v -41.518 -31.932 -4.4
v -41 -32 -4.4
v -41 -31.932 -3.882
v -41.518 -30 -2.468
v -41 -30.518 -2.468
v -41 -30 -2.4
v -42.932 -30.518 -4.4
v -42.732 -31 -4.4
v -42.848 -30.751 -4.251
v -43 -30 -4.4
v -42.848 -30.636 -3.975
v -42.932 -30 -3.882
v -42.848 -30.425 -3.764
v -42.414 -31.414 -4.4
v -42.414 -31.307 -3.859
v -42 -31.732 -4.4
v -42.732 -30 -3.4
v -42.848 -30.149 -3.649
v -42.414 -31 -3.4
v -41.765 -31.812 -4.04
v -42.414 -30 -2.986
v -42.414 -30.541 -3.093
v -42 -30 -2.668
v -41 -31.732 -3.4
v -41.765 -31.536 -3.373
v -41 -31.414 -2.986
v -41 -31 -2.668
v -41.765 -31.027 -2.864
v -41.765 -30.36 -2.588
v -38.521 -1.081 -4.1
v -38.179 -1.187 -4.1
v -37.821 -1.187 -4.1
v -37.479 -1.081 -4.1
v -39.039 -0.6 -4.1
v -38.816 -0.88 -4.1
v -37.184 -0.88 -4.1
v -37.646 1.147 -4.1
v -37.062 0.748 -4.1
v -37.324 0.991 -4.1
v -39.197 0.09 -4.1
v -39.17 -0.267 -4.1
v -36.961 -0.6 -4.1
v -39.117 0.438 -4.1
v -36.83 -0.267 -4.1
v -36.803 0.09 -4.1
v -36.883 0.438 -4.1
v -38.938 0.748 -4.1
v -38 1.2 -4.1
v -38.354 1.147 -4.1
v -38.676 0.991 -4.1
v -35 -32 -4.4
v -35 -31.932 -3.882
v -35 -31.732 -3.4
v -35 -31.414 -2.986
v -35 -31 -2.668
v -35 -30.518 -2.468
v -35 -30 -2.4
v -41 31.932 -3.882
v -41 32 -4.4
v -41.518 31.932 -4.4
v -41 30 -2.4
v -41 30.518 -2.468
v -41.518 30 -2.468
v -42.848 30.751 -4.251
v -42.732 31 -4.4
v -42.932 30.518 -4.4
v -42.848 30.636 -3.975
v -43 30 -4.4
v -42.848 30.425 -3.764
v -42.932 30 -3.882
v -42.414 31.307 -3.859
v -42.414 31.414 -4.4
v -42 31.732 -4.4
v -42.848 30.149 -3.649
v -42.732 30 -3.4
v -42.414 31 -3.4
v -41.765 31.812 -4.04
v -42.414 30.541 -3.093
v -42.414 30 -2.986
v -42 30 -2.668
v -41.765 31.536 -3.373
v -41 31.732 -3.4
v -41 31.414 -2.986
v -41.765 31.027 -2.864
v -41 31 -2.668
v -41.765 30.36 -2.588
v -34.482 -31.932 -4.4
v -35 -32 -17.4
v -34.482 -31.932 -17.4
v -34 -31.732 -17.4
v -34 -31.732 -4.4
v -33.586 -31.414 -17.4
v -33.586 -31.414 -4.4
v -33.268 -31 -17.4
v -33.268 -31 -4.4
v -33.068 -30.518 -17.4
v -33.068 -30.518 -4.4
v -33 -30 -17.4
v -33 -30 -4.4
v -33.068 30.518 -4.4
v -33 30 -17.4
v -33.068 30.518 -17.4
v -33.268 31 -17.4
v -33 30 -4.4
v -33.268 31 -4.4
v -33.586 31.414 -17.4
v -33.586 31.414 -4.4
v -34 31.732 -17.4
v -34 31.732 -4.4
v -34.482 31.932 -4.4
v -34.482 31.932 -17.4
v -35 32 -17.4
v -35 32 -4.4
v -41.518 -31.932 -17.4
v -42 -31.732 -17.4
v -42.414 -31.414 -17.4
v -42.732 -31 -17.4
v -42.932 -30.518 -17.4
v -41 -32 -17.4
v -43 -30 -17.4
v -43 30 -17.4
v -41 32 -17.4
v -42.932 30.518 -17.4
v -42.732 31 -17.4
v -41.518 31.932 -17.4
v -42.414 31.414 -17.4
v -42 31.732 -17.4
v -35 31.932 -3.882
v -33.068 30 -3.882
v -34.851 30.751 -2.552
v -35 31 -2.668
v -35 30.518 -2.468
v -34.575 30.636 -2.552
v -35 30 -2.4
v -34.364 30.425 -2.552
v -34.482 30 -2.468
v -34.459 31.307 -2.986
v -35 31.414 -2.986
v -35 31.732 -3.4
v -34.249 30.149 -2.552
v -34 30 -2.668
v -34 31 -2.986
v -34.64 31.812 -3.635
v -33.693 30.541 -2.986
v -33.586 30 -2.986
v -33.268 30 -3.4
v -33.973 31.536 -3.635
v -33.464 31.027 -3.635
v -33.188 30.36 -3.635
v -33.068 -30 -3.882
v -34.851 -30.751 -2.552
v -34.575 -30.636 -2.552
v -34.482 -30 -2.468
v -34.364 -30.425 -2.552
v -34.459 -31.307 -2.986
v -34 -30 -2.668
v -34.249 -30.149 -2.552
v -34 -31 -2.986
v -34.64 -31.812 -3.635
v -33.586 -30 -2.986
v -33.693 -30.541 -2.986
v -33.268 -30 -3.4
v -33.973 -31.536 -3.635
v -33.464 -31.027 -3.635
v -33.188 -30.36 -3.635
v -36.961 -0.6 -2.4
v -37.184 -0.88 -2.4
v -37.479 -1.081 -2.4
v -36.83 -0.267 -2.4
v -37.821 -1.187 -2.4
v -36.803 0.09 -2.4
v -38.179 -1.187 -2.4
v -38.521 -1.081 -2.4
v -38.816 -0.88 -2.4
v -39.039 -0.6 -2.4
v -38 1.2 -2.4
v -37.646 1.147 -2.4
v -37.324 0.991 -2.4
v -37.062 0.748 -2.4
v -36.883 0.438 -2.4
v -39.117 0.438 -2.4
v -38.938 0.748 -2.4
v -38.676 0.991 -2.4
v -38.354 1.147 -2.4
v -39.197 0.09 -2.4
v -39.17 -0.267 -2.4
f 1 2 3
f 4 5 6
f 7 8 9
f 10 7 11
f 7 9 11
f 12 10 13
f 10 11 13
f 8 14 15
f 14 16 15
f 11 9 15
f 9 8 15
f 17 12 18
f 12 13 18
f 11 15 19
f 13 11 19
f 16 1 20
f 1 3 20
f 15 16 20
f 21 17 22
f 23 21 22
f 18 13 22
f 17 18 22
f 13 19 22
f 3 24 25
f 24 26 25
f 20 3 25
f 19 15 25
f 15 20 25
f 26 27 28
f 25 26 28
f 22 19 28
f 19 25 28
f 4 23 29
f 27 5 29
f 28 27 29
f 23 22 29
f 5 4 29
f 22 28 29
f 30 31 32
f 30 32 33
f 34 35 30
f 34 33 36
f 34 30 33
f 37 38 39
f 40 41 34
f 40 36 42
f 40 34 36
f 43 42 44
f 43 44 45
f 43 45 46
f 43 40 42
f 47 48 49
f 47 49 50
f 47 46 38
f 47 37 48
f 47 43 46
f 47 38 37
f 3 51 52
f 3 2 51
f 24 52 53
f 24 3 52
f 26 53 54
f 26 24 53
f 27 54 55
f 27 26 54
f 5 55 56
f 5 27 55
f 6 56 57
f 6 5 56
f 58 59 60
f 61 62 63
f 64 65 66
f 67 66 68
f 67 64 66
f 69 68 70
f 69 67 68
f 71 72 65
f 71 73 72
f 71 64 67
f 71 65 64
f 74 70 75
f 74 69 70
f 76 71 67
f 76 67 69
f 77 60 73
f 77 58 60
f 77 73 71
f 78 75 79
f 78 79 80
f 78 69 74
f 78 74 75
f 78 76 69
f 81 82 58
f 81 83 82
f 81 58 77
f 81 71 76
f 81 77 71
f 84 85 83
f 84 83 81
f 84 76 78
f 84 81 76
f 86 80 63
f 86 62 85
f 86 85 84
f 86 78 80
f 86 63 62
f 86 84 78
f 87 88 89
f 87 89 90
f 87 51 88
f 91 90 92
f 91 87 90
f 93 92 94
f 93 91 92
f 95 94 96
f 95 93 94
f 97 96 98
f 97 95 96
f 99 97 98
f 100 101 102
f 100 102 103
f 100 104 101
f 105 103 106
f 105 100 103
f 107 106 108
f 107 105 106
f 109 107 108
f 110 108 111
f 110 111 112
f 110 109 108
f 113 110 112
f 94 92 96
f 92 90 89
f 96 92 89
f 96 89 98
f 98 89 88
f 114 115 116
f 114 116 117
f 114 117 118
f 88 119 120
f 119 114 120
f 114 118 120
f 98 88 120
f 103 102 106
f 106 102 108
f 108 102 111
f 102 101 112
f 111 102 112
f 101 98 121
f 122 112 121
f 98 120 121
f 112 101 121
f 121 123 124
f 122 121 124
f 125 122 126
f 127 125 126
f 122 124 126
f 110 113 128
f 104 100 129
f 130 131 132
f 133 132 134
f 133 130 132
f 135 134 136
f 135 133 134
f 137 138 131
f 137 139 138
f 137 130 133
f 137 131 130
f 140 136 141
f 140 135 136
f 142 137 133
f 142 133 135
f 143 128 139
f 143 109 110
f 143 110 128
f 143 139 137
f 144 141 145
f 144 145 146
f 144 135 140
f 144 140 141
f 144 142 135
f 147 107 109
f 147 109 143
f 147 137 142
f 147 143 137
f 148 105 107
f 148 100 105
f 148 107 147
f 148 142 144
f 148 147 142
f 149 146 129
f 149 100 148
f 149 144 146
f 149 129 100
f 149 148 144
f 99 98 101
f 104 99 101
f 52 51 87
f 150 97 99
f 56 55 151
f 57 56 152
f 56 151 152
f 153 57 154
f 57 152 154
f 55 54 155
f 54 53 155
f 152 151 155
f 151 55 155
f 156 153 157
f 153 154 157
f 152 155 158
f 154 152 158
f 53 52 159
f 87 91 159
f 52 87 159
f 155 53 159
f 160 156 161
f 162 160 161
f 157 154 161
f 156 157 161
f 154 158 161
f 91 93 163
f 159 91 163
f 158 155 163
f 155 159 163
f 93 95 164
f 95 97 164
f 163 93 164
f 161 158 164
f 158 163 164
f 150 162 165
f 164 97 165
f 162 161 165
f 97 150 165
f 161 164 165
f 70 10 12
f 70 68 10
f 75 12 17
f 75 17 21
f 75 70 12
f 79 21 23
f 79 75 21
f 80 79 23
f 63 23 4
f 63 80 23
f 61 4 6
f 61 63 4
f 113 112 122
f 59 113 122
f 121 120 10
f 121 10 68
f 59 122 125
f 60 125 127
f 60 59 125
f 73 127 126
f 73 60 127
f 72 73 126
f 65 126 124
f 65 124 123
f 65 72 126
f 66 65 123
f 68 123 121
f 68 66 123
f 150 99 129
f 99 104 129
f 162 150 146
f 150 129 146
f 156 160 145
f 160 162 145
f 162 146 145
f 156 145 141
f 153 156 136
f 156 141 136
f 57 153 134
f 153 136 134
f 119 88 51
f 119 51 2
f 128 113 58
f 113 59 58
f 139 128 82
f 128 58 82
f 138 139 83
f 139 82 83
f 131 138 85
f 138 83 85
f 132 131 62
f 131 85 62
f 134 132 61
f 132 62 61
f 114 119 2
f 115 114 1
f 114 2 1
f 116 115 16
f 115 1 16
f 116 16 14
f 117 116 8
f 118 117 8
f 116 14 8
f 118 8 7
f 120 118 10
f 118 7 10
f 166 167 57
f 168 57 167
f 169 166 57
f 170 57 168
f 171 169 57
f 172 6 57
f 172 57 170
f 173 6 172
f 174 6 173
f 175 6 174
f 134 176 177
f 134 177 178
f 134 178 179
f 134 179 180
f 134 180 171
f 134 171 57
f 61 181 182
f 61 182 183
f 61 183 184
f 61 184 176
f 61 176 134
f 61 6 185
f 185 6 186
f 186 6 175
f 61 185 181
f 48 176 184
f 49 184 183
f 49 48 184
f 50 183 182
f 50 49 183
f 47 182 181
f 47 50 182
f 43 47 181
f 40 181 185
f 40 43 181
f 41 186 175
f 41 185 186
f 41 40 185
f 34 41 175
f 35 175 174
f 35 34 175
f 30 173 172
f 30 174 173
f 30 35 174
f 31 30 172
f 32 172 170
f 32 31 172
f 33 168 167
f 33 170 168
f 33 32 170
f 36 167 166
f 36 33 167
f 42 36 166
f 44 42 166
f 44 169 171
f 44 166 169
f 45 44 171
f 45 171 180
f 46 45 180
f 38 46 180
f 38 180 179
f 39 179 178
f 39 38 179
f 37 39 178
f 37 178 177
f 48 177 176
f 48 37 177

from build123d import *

# Parameters (mm, degrees)
CYLINDER004_R          = 1.2
CYLINDER004_DEPTH      = 1.8
BOX014_W               = 64
BOX014_H               = 10
BOX014_DEPTH           = 15
FILLET005_R            = 2
CUT009_PLACEMENT_ANGLE = 90


with BuildPart() as array006:
    # Cylinder004 → Cylinder004 (new body)
    with BuildSketch(Plane(origin=(0, -50, 11.9), x_dir=(1, 0, 0), z_dir=(0, 0, 1))):
        Circle(CYLINDER004_R)
    extrude(amount=CYLINDER004_DEPTH)


with BuildPart() as unterteil:
    # Box014 → Box014 (new body)
    with BuildSketch(Plane(origin=(-32, -55, -1.4), x_dir=(1, 0, 0), z_dir=(0, 0, 1))):
        with Locations((32, 5)):
            Rectangle(BOX014_W, BOX014_H)
    extrude(amount=BOX014_DEPTH)

    # Fillet005
    fillet005_edges = [unterteil.edges().sort_by_distance(p)[0] for p in [
        (-32, -55, 6.1),
        (-32, -50, 13.6),
        (-32, -45, 6.1),
        (32, -55, 6.1),
        (32, -50, 13.6),
        (32, -45, 6.1),
        (0, -55, 13.6),
        (0, -45, 13.6),
    ]]
    fillet(fillet005_edges, radius=FILLET005_R)

    # Cut009: cut Array006
    add(array006.part, mode=Mode.SUBTRACT)


with BuildPart() as unterteil_1:
    # Cut009 placement: moved
    add(unterteil.part.moved(Location((-88, 0, -16))).rotate(Axis((-88, 0, -16), (0, 0, 1)), CUT009_PLACEMENT_ANGLE))


solid = unterteil_1.part
